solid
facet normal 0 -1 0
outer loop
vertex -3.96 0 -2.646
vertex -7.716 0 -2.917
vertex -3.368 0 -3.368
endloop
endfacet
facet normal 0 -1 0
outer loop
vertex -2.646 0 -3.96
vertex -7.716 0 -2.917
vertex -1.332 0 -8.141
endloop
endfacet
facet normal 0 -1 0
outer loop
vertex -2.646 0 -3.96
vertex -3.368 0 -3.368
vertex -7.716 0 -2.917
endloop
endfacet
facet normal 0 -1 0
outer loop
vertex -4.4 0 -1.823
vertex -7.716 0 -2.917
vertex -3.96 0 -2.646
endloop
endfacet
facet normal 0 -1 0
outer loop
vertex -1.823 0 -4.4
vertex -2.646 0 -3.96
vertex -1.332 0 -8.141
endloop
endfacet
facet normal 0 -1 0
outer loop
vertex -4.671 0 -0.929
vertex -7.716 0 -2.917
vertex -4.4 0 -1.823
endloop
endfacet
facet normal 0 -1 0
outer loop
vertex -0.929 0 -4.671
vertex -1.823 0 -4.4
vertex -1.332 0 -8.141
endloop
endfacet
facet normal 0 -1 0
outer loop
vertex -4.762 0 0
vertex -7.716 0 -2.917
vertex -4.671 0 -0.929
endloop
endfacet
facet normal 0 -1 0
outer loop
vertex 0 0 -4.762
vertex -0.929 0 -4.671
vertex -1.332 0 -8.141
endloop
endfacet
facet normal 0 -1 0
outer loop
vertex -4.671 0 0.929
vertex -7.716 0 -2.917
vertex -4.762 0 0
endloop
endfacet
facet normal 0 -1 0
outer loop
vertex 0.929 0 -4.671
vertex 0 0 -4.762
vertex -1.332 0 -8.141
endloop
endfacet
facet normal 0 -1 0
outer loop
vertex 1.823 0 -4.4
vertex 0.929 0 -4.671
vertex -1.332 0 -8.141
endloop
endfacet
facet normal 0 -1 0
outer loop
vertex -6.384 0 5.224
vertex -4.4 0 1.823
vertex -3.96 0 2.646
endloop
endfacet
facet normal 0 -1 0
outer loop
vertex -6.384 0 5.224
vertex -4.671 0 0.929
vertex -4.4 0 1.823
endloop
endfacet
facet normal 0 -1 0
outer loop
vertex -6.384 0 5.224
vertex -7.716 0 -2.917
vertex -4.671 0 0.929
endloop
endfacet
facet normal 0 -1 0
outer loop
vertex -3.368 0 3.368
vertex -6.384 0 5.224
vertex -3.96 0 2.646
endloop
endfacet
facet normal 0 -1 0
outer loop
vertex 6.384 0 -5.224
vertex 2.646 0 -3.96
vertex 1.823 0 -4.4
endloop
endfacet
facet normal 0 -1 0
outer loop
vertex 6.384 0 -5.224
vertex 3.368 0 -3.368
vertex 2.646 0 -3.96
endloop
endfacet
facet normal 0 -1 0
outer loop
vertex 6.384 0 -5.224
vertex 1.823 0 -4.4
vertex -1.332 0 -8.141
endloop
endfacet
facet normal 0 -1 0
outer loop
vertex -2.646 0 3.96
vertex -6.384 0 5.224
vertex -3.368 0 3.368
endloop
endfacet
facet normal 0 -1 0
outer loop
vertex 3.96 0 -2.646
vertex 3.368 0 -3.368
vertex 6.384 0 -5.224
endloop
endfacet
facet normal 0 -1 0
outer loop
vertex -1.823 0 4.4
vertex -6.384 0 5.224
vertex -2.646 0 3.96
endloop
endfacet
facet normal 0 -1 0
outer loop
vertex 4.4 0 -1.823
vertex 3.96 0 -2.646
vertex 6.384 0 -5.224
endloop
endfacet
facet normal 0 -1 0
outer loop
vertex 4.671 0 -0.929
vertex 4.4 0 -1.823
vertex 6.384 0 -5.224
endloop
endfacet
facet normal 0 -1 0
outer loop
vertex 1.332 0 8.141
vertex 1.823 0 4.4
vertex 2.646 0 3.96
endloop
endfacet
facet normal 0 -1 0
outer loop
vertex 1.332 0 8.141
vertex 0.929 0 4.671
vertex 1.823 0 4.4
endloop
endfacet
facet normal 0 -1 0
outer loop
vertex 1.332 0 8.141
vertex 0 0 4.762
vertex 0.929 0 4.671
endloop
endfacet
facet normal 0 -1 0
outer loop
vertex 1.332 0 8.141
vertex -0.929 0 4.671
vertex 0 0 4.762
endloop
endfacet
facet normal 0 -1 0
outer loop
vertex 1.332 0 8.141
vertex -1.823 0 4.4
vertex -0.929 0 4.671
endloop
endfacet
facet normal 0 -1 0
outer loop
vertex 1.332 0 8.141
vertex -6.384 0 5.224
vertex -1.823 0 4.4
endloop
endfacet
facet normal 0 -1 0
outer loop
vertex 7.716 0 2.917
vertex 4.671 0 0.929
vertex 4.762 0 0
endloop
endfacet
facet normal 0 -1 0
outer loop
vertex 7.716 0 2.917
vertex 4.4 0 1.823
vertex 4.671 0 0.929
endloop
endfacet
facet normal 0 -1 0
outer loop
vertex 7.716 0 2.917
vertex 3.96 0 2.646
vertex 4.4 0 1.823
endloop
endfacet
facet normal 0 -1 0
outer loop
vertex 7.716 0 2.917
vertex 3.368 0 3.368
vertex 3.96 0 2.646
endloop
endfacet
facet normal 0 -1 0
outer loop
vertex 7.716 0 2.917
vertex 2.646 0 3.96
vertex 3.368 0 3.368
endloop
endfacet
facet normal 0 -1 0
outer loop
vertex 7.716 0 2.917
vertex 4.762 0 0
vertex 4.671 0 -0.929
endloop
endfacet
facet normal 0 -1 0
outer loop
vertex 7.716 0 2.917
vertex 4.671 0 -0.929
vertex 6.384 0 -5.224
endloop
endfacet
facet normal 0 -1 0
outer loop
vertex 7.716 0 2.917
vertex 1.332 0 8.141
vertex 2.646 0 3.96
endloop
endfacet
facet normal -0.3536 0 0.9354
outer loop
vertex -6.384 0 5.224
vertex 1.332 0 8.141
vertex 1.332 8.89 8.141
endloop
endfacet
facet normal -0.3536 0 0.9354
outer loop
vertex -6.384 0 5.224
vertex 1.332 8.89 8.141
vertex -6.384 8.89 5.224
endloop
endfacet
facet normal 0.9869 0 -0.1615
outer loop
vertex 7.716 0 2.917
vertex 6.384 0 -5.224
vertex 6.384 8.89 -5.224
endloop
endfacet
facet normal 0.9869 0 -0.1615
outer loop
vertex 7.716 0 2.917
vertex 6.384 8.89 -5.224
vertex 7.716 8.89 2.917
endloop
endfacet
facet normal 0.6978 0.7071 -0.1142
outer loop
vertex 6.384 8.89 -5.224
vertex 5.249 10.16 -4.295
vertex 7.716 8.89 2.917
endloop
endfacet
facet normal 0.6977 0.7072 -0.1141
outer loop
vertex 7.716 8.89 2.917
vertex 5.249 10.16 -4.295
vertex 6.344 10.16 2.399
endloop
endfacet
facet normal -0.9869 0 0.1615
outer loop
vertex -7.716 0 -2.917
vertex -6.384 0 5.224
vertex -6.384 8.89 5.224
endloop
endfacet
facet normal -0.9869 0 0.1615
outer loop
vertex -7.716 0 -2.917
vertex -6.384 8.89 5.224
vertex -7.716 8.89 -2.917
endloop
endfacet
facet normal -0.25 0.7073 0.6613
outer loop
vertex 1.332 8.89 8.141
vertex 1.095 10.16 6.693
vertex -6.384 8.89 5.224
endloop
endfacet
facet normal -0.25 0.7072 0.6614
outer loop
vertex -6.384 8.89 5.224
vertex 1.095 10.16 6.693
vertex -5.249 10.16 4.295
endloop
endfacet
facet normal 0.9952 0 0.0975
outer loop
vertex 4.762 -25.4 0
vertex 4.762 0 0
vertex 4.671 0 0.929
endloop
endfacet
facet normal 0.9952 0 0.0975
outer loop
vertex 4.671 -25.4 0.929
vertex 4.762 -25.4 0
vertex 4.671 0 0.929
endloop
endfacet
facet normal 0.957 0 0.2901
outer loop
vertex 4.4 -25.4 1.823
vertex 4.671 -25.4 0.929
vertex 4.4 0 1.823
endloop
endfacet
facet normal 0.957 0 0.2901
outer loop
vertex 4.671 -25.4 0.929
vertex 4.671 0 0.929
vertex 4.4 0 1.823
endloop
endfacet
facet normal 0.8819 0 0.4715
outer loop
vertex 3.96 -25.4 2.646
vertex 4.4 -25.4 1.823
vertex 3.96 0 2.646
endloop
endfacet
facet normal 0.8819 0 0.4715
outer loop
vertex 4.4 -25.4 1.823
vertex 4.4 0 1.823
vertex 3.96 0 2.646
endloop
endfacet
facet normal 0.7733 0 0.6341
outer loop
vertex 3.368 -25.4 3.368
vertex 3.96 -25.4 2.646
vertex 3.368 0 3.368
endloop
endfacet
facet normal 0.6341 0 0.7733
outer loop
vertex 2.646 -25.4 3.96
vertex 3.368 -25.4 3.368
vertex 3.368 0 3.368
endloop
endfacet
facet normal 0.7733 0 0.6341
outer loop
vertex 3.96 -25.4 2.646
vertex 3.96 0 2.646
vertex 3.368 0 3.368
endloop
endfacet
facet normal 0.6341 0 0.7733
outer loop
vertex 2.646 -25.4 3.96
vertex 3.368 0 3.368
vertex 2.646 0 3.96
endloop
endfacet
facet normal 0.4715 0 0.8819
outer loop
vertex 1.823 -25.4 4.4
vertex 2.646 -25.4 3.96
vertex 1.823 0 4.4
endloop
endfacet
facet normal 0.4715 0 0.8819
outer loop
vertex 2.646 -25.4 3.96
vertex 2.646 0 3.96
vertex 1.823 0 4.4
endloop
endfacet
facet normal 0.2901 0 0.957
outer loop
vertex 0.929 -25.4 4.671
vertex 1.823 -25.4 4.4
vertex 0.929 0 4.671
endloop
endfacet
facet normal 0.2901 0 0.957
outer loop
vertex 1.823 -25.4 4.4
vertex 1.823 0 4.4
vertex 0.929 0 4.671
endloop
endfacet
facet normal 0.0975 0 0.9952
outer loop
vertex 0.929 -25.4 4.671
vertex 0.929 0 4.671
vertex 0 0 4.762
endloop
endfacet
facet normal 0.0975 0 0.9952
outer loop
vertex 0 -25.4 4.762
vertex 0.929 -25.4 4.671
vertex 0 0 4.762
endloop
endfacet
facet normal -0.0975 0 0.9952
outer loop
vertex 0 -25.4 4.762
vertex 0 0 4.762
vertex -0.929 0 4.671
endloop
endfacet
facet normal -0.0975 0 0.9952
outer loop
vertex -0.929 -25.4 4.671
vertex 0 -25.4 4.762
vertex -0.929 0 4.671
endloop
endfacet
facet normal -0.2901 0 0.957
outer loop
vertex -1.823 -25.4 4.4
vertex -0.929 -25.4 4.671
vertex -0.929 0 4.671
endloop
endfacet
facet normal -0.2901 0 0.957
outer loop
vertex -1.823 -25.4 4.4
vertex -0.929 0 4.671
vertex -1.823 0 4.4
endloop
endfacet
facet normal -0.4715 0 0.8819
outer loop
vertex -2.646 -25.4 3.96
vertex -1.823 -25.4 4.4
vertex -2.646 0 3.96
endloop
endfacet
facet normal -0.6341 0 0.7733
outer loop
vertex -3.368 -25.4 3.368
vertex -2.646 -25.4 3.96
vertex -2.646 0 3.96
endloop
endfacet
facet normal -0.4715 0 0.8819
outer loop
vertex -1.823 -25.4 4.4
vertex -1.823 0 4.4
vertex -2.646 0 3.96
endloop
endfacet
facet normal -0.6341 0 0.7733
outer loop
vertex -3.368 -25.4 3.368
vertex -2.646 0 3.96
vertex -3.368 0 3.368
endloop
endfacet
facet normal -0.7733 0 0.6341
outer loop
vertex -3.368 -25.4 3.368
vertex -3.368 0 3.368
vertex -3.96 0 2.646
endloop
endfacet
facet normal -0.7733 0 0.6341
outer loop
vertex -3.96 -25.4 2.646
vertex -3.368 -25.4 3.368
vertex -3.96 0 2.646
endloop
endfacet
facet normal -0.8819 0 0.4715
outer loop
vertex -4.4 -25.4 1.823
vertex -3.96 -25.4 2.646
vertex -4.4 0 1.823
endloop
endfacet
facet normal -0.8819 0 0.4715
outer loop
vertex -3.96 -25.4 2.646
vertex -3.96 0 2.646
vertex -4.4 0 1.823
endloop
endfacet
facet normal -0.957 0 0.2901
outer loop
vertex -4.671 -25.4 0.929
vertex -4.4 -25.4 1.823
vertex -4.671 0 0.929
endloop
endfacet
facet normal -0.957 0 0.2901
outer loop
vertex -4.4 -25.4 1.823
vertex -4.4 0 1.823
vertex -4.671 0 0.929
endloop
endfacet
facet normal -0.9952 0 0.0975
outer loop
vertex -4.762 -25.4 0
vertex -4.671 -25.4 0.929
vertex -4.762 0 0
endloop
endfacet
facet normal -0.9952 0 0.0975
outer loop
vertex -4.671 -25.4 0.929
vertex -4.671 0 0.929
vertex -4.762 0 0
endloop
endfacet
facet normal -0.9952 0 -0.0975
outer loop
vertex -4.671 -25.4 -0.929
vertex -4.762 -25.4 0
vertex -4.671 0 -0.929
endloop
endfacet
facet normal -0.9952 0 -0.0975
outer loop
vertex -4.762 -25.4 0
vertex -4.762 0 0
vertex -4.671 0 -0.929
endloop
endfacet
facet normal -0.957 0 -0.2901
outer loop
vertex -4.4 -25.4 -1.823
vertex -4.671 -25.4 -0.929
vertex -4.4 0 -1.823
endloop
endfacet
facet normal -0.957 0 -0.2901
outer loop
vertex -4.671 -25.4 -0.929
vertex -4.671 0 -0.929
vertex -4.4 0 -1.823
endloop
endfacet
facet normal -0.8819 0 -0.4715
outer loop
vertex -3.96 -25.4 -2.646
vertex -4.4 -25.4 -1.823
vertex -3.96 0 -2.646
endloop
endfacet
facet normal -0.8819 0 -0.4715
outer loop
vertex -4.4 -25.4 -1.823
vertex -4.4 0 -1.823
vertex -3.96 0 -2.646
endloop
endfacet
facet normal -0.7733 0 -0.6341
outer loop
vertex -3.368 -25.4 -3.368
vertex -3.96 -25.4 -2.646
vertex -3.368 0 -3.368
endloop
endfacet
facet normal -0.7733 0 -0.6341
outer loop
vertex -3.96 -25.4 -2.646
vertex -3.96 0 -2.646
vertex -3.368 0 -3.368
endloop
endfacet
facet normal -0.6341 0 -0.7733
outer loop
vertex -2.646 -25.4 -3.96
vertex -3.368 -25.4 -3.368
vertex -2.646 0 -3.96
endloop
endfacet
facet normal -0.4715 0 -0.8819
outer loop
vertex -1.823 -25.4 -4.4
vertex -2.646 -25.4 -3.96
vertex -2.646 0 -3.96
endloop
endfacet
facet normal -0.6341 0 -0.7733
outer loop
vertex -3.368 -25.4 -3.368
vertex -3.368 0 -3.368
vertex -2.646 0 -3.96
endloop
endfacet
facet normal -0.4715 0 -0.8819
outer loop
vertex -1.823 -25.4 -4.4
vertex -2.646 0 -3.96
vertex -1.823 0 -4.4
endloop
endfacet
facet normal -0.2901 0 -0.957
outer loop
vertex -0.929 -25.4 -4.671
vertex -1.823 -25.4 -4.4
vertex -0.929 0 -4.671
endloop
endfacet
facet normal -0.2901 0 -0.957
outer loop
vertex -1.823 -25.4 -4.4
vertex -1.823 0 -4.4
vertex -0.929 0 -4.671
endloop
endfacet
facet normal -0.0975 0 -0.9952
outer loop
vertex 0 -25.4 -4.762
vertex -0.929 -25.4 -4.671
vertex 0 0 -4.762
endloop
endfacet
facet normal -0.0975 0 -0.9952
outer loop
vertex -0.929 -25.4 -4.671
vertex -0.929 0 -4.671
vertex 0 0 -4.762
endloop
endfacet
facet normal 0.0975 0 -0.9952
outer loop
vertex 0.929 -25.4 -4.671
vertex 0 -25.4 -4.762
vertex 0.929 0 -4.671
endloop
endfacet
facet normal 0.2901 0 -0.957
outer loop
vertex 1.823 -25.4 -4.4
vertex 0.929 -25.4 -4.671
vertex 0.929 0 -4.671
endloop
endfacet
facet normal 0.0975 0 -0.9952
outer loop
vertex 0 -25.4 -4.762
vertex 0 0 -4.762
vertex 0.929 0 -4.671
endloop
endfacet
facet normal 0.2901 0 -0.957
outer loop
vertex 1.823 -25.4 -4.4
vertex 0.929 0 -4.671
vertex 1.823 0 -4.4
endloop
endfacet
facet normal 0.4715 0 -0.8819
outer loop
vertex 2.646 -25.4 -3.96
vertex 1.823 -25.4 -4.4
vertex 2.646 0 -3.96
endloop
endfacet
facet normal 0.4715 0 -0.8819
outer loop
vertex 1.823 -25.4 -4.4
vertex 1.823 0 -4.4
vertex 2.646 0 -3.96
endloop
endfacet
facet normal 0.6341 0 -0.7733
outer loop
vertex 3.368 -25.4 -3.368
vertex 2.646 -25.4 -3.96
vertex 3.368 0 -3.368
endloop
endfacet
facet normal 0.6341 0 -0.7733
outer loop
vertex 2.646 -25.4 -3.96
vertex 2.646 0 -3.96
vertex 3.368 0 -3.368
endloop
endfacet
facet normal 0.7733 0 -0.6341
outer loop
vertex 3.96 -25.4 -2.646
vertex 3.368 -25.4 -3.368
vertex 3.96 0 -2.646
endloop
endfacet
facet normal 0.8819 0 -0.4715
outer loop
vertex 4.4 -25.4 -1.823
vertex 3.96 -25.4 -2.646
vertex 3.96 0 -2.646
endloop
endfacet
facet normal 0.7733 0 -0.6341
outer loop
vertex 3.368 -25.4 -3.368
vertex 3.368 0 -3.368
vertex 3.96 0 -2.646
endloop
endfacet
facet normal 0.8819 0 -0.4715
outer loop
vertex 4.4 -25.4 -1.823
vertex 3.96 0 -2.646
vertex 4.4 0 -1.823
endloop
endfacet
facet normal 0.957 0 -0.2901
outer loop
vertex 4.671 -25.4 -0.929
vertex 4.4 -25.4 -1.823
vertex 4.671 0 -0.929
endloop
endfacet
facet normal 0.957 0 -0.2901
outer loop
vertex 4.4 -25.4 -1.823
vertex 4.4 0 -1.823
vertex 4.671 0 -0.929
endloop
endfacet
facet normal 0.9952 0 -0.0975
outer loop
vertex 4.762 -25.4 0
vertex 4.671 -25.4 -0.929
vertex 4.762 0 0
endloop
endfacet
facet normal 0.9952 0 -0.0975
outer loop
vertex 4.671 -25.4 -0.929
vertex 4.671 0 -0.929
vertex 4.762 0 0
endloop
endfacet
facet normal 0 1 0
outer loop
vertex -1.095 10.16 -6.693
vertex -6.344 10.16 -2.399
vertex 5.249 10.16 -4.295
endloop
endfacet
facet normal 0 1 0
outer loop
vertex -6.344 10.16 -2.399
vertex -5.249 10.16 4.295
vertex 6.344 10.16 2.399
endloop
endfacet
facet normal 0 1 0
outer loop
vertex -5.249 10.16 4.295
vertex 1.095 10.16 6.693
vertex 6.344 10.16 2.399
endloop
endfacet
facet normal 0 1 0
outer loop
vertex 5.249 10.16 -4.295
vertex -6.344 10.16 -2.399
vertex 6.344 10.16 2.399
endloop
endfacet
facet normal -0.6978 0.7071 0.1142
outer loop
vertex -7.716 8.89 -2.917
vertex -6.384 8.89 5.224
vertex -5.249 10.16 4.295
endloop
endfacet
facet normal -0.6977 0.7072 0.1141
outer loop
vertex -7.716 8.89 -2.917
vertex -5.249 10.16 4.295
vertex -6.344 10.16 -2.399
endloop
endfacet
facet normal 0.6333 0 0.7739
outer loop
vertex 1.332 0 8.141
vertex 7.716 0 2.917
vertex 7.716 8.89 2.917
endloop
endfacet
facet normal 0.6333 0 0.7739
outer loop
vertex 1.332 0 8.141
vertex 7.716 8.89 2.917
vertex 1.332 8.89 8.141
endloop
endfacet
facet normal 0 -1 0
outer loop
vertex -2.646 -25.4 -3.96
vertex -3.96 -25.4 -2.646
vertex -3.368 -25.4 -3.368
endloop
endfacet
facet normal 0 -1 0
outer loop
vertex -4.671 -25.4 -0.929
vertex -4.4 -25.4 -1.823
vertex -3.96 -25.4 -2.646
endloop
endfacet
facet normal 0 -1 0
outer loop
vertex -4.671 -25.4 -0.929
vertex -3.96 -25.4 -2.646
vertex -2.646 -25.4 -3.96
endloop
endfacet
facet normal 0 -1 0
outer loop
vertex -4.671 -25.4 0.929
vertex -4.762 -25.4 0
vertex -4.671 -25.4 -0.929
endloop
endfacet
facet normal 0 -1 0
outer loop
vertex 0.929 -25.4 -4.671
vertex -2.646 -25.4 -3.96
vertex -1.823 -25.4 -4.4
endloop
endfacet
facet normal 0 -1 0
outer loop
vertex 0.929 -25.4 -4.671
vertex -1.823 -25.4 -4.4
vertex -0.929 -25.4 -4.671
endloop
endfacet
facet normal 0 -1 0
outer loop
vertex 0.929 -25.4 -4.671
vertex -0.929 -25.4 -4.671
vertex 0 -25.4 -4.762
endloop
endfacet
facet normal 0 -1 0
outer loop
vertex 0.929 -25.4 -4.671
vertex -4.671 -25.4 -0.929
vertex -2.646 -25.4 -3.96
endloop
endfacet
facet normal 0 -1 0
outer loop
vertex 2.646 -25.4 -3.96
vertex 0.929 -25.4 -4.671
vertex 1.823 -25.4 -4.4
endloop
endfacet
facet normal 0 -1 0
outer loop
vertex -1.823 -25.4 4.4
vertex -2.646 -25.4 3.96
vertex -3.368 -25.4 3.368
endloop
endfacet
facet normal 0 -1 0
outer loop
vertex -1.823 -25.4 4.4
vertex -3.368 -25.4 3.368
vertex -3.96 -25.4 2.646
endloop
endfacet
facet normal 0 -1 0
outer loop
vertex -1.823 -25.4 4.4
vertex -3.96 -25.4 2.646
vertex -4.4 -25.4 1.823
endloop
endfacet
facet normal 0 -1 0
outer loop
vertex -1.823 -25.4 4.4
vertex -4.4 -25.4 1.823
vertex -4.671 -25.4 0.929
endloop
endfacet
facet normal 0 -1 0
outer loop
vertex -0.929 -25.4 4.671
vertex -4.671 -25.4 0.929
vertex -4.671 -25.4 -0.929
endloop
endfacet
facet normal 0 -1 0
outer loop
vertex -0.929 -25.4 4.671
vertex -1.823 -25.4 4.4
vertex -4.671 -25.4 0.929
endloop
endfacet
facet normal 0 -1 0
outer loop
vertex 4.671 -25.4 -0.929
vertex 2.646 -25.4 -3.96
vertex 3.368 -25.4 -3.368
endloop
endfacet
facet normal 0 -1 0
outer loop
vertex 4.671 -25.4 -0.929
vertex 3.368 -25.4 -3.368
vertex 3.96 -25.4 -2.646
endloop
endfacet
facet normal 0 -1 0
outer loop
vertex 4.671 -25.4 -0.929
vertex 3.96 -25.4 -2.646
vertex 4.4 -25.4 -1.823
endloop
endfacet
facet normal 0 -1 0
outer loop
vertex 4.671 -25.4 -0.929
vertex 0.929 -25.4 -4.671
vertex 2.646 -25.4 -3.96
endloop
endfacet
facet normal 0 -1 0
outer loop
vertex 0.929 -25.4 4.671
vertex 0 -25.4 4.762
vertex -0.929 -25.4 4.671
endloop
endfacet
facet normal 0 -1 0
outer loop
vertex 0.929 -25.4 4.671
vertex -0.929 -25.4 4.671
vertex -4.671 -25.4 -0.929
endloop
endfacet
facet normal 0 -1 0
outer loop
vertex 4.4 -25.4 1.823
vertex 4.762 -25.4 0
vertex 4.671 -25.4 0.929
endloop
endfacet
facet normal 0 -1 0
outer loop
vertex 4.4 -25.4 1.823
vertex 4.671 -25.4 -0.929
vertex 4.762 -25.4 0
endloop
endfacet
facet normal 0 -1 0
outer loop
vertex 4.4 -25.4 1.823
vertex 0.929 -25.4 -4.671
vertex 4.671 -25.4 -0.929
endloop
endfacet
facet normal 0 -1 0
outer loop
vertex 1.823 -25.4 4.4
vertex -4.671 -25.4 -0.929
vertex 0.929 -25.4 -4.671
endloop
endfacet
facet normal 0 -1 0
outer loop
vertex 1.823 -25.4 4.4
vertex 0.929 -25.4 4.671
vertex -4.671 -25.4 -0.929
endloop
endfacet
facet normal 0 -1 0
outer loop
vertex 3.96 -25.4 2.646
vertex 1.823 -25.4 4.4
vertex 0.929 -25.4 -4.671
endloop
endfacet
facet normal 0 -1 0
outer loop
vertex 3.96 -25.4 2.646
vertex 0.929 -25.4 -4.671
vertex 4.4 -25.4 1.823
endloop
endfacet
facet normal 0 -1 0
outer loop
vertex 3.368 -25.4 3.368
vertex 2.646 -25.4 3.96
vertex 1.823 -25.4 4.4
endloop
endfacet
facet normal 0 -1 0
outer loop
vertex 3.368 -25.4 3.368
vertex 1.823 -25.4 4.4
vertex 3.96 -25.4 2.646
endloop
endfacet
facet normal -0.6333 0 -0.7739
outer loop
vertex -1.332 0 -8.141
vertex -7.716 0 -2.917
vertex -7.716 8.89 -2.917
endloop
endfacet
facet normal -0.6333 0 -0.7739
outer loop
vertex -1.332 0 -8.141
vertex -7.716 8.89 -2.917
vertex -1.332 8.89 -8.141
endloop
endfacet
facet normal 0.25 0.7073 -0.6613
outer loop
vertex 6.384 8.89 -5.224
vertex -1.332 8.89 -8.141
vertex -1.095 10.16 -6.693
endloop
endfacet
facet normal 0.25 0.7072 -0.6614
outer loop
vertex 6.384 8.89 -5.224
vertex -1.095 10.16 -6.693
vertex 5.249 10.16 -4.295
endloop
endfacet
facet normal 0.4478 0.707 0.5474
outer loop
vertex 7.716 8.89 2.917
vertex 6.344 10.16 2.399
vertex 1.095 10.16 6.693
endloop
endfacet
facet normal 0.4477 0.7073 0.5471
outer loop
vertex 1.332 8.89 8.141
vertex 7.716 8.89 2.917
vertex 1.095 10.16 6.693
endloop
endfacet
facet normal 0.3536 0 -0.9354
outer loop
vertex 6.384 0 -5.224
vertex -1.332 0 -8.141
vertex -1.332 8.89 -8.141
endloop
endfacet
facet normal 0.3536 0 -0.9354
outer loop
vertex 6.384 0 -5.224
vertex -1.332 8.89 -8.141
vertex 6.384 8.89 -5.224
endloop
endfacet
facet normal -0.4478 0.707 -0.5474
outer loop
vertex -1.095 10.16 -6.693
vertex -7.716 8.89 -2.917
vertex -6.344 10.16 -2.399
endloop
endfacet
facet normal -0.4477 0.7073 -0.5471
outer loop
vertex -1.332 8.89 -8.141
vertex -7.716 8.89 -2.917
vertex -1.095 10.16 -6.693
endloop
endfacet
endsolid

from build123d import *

# Parameters (mm, degrees)
F1_DEPTH = 10.16
F2_R     = 4.7625
F3_DEPTH = 25.4
F4_SIZE  = 1.27


with BuildPart() as f1:
    # F0 (on Front) → F1 (new body)
    with BuildSketch(Plane.XZ):
        Polygon((7.715837, 2.917203), (1.331547, 8.140713), (-6.38429, 5.22351), (-7.715837, -2.917203), (-1.331547, -8.140713), (6.38429, -5.22351), align=None)
    extrude(amount=-F1_DEPTH)

    # F2 (on Front) → F3 (join)
    with BuildSketch(Plane.XZ):
        Circle(F2_R)
    extrude(amount=F3_DEPTH)

    # F4
    f4_edges = [f1.edges().sort_by_distance(p)[0] for p in [
        (-7.050064, 10.16, 1.153154),
        (-2.526371, 10.16, 6.682111),
        (4.523692, 10.16, 5.528958),
        (-4.523692, 10.16, -5.528958),
        (2.526371, 10.16, -6.682111),
        (7.050064, 10.16, -1.153154),
    ]]
    chamfer(f4_edges, length=F4_SIZE)


solid = f1.part
